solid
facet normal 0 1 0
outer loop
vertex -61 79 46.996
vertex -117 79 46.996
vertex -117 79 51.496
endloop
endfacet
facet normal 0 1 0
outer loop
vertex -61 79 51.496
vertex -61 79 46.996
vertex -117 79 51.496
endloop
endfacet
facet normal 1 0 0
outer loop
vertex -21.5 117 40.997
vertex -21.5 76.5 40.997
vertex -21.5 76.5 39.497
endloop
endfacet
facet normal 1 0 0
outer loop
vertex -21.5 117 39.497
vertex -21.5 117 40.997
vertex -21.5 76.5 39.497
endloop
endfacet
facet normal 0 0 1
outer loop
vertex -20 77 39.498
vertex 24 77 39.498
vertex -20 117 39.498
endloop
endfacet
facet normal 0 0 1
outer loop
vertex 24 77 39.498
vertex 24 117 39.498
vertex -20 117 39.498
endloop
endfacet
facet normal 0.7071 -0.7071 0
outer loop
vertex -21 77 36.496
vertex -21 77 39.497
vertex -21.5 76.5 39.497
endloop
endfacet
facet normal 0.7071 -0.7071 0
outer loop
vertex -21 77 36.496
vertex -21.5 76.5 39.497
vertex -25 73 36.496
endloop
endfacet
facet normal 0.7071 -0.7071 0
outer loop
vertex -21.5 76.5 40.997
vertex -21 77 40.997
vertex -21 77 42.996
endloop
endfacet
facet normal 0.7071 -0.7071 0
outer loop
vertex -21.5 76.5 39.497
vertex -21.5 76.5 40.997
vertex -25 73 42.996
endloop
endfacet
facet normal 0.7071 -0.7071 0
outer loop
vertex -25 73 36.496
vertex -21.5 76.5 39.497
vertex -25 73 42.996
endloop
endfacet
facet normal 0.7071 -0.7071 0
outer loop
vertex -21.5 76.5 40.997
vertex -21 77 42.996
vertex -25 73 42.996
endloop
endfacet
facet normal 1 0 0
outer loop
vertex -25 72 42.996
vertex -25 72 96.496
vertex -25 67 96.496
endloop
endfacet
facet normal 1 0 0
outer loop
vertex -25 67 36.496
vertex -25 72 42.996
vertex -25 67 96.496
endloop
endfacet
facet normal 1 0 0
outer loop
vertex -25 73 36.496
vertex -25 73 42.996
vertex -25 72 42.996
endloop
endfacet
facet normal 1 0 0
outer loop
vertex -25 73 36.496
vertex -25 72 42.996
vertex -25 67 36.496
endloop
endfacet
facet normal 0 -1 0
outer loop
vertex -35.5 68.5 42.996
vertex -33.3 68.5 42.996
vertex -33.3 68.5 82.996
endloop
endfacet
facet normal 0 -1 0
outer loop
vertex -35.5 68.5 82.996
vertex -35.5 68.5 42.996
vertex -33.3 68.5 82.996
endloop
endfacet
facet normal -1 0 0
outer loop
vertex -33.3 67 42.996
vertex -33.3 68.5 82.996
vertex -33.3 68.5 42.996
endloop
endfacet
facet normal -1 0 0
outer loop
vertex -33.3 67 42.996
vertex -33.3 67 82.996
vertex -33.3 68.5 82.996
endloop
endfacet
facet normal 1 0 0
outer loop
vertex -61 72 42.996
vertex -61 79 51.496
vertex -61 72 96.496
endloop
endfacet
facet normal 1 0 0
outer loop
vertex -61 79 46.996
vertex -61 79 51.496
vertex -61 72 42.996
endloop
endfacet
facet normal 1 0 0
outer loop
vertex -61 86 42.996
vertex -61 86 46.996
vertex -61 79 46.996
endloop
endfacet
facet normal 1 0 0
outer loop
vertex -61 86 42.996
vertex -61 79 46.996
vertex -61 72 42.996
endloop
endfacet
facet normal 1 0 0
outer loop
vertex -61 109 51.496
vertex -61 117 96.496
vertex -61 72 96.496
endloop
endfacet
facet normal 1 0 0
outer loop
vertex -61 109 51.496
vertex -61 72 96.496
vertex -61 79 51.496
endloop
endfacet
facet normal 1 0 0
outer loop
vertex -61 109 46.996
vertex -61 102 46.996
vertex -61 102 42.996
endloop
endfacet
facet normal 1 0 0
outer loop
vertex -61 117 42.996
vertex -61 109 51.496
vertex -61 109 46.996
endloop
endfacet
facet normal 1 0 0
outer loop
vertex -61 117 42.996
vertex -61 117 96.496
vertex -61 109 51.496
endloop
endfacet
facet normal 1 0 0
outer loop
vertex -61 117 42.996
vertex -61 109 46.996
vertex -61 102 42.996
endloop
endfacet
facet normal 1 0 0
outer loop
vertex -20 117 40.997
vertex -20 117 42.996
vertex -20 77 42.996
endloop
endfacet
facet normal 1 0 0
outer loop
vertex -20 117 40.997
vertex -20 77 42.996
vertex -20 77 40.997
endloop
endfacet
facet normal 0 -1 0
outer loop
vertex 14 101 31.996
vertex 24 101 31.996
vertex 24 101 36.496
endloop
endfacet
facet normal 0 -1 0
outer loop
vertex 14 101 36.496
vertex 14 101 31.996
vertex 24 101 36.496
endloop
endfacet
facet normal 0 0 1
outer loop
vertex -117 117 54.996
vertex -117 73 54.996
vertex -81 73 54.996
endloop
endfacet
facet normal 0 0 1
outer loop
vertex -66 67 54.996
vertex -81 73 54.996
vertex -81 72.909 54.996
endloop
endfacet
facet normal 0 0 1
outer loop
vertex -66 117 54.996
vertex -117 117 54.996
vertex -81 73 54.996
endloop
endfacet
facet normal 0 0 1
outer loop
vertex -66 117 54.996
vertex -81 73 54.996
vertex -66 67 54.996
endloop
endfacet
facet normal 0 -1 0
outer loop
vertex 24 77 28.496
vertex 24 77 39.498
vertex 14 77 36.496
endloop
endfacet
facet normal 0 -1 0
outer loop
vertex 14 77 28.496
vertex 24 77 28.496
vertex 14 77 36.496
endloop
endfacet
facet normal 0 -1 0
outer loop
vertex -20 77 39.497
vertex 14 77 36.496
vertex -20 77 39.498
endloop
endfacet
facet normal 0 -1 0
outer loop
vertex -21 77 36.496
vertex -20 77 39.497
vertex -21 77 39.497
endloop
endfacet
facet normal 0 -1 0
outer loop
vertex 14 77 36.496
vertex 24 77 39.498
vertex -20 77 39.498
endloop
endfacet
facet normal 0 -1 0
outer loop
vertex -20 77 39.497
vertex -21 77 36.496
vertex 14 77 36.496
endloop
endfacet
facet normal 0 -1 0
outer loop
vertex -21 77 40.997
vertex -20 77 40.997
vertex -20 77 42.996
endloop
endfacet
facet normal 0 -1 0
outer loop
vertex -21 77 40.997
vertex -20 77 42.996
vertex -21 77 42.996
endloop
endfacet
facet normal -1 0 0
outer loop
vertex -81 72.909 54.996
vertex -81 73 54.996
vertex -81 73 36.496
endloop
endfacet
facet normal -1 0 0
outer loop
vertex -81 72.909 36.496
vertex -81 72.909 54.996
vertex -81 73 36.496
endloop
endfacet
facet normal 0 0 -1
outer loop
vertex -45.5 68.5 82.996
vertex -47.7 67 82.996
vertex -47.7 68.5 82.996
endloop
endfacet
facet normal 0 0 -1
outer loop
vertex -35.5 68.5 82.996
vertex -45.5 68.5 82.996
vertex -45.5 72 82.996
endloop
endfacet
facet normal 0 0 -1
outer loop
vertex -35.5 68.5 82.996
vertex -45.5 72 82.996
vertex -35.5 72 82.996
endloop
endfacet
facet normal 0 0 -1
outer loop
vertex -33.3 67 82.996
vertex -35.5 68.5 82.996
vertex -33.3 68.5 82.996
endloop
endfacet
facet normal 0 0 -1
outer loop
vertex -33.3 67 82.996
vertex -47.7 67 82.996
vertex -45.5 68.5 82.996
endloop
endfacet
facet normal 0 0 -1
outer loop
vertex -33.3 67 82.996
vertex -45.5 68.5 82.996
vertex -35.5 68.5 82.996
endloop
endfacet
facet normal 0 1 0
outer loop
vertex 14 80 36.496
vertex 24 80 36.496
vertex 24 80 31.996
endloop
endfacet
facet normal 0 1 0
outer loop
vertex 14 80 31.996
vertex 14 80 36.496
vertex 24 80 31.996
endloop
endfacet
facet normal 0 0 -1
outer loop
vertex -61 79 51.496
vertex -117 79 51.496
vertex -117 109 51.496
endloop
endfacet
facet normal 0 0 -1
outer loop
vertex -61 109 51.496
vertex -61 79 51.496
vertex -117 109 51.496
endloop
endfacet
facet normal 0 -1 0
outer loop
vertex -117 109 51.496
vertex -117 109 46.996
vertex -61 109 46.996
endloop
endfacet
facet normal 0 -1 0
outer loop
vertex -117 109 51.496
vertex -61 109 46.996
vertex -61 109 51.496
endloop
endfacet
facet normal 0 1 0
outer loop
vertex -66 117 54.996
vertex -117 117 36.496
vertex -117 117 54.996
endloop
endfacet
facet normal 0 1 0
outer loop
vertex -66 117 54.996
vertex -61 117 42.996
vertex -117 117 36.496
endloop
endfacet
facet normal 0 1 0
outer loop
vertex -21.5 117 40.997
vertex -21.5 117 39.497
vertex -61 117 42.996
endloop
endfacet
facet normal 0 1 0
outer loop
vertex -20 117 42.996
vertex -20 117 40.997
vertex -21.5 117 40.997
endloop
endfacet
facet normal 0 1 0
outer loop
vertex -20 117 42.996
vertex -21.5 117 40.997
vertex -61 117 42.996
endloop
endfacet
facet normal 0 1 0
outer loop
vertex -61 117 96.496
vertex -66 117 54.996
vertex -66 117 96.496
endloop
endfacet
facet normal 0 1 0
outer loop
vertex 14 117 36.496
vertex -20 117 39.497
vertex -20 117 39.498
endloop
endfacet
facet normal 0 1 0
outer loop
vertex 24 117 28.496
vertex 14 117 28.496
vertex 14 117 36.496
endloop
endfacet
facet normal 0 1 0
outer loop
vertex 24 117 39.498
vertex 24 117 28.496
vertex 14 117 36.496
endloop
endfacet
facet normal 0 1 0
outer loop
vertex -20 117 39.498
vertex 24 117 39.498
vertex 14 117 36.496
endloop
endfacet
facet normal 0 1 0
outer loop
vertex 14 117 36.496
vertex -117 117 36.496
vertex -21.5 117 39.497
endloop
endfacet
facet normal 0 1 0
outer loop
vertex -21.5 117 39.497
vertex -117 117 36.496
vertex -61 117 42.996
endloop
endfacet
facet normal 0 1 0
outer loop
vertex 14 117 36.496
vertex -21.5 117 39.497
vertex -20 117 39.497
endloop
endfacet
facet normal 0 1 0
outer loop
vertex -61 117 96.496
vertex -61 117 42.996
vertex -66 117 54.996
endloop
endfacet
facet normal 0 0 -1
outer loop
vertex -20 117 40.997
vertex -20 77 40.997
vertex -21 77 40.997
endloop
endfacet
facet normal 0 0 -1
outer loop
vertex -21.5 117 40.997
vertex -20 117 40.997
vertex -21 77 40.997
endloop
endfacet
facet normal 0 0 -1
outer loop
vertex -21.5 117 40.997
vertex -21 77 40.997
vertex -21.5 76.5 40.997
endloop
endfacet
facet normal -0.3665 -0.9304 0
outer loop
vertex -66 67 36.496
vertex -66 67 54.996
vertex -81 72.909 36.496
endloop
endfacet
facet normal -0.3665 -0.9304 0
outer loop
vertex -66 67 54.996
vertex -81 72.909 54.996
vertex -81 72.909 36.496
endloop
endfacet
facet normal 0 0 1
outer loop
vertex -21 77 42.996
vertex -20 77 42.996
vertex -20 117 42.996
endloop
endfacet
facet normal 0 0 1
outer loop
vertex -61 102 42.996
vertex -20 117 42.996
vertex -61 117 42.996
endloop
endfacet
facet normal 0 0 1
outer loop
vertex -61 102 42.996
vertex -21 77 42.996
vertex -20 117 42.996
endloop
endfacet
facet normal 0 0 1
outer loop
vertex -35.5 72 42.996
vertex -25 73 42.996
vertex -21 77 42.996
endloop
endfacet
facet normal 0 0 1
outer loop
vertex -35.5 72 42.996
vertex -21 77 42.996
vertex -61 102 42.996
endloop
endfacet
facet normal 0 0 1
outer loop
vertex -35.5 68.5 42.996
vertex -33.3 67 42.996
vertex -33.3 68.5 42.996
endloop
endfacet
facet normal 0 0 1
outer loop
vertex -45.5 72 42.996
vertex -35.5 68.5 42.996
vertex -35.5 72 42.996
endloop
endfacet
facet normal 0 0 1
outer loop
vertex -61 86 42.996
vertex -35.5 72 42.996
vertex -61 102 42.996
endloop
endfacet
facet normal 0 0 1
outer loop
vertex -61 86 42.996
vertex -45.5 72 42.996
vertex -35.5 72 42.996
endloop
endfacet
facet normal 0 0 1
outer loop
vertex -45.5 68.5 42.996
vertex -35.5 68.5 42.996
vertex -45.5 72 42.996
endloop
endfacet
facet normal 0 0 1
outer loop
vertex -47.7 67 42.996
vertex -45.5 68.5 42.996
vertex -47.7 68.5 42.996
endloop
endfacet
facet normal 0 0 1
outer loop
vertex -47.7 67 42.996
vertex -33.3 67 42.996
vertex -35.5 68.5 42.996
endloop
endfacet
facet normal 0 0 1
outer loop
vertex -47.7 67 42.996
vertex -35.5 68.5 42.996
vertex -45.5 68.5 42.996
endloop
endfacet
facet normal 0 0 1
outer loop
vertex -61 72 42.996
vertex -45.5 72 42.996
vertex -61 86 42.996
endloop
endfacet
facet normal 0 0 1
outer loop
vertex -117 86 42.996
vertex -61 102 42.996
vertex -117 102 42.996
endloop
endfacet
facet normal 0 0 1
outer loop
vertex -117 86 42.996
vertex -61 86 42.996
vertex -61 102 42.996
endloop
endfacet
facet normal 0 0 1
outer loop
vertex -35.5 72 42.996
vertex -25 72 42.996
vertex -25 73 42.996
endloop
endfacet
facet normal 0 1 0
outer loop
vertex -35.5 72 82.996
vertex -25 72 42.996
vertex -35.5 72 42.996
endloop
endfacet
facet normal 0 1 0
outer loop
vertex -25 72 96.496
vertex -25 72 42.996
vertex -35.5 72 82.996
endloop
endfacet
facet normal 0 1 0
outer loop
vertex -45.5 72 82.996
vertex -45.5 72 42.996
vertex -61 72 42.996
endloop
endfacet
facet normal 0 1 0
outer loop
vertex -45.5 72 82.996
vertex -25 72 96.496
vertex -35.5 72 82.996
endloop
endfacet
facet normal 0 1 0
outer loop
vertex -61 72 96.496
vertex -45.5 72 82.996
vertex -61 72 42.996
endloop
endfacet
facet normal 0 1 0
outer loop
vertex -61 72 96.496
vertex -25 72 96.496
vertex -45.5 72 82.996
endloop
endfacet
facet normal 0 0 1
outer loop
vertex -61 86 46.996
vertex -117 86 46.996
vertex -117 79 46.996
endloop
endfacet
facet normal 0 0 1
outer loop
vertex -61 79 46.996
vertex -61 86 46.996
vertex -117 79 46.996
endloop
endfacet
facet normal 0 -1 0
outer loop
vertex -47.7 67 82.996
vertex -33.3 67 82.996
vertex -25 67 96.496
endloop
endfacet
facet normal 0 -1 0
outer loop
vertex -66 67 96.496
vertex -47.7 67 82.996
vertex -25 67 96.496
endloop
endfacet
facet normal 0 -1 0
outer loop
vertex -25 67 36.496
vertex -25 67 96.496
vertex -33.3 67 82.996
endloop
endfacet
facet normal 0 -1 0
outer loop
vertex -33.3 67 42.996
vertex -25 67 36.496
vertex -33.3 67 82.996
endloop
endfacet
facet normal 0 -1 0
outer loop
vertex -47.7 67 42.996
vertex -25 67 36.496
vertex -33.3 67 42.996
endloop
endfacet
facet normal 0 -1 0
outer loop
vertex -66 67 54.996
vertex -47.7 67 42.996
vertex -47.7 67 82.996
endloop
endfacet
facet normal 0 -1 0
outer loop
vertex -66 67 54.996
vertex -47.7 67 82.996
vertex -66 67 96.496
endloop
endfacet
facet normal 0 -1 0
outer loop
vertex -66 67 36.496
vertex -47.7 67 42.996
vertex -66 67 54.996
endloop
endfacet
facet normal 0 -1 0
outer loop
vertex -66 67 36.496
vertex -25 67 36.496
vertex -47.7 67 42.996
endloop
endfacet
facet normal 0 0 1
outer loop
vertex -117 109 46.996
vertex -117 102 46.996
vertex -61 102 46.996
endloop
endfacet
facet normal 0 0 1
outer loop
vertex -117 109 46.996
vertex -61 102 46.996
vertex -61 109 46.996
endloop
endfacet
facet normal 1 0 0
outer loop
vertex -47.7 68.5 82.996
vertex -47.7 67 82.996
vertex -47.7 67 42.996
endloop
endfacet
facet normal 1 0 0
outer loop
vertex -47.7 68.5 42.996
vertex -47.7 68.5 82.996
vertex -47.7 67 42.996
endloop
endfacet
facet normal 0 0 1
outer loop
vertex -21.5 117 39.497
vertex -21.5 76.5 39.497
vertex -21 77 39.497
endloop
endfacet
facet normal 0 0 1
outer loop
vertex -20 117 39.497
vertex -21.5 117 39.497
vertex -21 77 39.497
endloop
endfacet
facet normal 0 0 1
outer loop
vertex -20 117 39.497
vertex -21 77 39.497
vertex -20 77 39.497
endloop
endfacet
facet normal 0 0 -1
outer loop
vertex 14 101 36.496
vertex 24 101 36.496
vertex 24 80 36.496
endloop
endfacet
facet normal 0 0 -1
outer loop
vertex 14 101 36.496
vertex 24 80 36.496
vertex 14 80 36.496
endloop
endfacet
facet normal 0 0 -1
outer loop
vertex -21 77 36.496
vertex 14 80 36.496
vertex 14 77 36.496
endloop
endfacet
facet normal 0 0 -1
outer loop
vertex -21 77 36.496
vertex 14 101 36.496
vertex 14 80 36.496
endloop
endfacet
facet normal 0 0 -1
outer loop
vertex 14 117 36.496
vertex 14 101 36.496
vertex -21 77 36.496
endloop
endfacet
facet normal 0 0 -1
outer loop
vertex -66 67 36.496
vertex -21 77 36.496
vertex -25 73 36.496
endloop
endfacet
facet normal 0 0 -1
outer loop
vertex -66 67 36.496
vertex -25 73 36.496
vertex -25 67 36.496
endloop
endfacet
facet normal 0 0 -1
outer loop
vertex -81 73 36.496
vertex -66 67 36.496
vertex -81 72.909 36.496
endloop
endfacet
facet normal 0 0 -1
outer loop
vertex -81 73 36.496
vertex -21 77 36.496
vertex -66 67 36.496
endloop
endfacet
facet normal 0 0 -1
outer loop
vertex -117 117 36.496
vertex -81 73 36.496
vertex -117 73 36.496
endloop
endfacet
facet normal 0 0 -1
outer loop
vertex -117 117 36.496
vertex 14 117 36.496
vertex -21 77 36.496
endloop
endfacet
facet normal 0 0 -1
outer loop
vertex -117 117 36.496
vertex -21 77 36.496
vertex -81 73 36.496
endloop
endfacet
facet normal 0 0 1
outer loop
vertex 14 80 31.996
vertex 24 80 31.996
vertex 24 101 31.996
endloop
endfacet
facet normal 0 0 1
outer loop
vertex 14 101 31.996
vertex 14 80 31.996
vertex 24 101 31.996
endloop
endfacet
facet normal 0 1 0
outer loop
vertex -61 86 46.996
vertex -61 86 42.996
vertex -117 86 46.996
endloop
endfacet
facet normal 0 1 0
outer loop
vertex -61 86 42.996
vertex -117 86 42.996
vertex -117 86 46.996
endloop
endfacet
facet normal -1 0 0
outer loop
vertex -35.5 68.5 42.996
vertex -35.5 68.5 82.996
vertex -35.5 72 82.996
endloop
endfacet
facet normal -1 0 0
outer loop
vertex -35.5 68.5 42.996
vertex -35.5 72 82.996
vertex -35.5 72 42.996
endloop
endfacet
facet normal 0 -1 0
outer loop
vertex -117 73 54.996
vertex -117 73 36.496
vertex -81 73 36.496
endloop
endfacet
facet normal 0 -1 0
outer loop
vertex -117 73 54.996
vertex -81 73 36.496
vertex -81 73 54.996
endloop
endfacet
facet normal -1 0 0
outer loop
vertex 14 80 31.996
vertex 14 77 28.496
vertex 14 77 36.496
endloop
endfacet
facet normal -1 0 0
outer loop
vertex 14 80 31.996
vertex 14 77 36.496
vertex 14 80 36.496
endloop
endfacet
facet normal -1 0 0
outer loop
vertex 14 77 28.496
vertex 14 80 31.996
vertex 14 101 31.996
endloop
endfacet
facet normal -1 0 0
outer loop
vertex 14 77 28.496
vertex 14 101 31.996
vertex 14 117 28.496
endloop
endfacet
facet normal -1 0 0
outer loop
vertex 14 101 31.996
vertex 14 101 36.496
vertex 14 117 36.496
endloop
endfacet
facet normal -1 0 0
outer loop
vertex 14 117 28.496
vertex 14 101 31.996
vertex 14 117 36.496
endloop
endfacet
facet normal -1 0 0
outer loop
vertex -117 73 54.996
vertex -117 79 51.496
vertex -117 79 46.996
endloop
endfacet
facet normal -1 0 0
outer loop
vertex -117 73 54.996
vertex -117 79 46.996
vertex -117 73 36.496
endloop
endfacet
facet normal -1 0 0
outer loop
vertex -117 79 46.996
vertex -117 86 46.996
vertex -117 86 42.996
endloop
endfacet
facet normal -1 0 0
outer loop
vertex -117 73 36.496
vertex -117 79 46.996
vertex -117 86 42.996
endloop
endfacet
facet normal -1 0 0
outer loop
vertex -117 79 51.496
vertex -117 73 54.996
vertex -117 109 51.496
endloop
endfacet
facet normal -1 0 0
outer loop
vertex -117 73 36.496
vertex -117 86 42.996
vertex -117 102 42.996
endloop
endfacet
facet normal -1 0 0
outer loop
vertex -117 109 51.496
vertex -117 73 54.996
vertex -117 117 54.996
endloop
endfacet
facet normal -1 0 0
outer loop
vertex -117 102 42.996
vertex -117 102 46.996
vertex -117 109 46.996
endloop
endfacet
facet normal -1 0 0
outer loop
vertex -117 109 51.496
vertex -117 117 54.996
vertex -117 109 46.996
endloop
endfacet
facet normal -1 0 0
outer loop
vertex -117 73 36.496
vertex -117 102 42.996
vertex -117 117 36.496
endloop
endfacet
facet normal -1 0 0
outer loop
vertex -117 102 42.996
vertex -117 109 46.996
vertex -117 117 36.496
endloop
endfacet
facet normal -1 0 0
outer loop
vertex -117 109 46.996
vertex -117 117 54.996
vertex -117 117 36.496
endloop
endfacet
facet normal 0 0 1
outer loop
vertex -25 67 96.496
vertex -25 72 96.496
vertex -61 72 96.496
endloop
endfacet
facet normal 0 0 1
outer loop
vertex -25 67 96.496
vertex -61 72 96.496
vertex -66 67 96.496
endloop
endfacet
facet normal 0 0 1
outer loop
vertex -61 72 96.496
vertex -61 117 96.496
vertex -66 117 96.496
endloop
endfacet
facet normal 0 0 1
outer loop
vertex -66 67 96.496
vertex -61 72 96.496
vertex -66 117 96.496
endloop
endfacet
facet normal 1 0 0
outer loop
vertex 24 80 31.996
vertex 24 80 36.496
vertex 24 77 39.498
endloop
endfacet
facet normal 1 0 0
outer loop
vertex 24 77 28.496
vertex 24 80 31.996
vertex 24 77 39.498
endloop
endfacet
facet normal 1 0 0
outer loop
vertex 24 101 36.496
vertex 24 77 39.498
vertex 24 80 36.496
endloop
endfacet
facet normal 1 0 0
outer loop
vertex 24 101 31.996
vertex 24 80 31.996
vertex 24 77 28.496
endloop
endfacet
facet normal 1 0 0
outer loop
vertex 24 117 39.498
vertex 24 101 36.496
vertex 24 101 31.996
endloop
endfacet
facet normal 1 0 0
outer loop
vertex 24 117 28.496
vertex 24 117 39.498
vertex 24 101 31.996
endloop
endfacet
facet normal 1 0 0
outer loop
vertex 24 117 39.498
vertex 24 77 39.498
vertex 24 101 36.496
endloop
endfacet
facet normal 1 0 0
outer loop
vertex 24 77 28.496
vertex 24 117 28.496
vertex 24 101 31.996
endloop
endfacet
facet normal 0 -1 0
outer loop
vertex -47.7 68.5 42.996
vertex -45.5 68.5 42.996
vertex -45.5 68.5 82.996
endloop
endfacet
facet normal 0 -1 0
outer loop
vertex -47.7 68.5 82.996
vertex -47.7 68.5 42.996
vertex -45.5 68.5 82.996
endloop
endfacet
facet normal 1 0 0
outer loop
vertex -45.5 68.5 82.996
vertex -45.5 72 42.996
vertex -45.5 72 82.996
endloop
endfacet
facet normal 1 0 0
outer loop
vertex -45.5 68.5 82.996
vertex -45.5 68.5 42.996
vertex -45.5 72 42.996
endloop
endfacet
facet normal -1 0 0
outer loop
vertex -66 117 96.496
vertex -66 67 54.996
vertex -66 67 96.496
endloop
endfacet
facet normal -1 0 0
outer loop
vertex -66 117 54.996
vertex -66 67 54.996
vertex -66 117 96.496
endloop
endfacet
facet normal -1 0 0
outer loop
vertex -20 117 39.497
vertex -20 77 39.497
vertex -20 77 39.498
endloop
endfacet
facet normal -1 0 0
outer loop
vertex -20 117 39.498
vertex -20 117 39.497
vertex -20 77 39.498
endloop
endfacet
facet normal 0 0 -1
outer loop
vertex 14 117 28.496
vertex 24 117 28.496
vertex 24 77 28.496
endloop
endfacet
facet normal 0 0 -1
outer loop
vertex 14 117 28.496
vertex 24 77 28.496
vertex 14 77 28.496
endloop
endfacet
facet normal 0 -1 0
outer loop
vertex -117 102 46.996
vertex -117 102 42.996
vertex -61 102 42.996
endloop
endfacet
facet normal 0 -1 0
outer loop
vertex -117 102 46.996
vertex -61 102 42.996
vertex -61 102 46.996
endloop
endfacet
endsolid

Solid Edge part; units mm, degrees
sketch "Sketch1" plane through (0, 117, 0) normal (0, -1, 0) x (1, 0, 0)
  line L0 (-117, 54.9958) -> (-61, 54.9958)
  line L1 (-61, 54.9958) -> (-61, 42.9958)
  line L2 (-61, 42.9958) -> (-20, 42.9958)
  line L3 (-20, 42.9958) -> (-20, 39.4975)
  line L4 (24, 39.4975) -> (-20, 39.4975)
  line L5 (24, 39.4975) -> (24, 36.4958)
  line L6 (24, 36.4958) -> (-117, 36.4958)
  line L7 (-117, 54.9958) -> (-117, 36.4958)
extrude "Protrusion1" add sketch "Sketch1" along normal blind 44
sketch "Sketch2" plane through (-117, 95, 45.2466) normal (-1, 0, 0) x (0, -1, 0)
  line L0 (9, 1.7492) -> (16, 1.7492)
  line L1 (16, 1.7492) -> (16, 6.2492)
  line L2 (16, 6.2492) -> (1, 6.2492)
  line L3 (-14, 6.2492) -> (1, 6.2492)
  line L4 (-14, 1.7492) -> (-14, 6.2492)
  line L5 (-7, 1.7492) -> (-14, 1.7492)
  line L6 (-7, -2.2508) -> (-7, 1.7492)
  line L7 (-7, -2.2508) -> (9, -2.2508)
  line L8 (9, -2.2508) -> (9, 1.7492)
extrude "Cutout1" cut sketch "Sketch2" against normal up to next
sketch "Sketch3" plane through (-2.5, 73, 39.2466) normal (0, -1, 0) x (1, 0, 0)
  line L0 (-17.5, 1.7508) -> (-19, 1.7508)
  line L1 (-19, 1.7508) -> (-19, 0.2508)
  line L2 (-19, 0.2508) -> (-17.5, 0.2508)
  line L3 (-17.5, 0.2508) -> (-17.5, 1.7508)
extrude "Cutout2" cut sketch "Sketch3" against normal up to next
sketch "Sketch4" plane through (3.25, 95, 39.4975) normal (0, 0, 1) x (1, 0, 0)
  line L0 (20.75, -22) -> (20.75, -18)
  line L1 (20.75, -18) -> (-24.25, -18)
  line L2 (-24.25, -18) -> (-28.25, -22)
  line L3 (20.75, -22) -> (-28.25, -22)
extrude "Cutout3" cut sketch "Sketch4" against normal up to next and the other way up to next
sketch "Sketch5" plane through (-46.5, 92.5, 36.4958) normal (0, 0, -1) x (0, 1, 0)
  line L0 (-15.5, 60.5) -> (24.5, 60.5)
  line L1 (24.5, 60.5) -> (24.5, 70.5)
  line L2 (24.5, 70.5) -> (-15.5, 70.5)
  line L3 (-15.5, 70.5) -> (-15.5, 60.5)
extrude "ExtrudedProtrusion_6" add sketch "Sketch5" along normal blind 8
sketch "Sketch6" plane through (24, 98.5, 34.4966) normal (1, 0, 0) x (0, 1, 0)
  line L0 (2.5, -2.5008) -> (2.5, 1.9992)
  line L1 (2.5, 1.9992) -> (-18.5, 1.9992)
  line L2 (-18.5, 1.9992) -> (-18.5, -2.5008)
  line L3 (-18.5, -2.5008) -> (2.5, -2.5008)
extrude "Cutout4" cut sketch "Sketch6" against normal up to next
sketch "Sketch7" plane through (-71, 73, 45.7458) normal (0, -1, 0) x (1, 0, 0)
  line L0 (10, 50.75) -> (10, 9.25)
  line L1 (10, 9.25) -> (-10, 9.25)
  line L2 (-10, 9.25) -> (-10, -9.25)
  line L3 (-10, -9.25) -> (46, -9.25)
  line L4 (46, 50.75) -> (46, -9.25)
  line L5 (10, 50.75) -> (46, 50.75)
extrude "ExtrudedProtrusion_7" add sketch "Sketch7" along normal blind 6
chamfer "Chamfer_4" distance 15 angle 21.5 1 edges at (-81, 67, 45.7458) measured on face at (-52.44, 67, 87.0958)
sketch "Sketch8" plane through (-47.75, 67, 59.9958) normal (0, -1, 0) x (1, 0, 0)
  line L0 (2.25, -17) -> (2.25, 23)
  line L1 (2.25, 23) -> (12.25, 23)
  line L2 (12.25, 23) -> (12.25, -17)
  line L3 (12.25, -17) -> (2.25, -17)
extrude "Cutout5" cut sketch "Sketch8" against normal up to next
sketch "Sketch9" plane through (-47.75, 67, 59.9958) normal (0, -1, 0) x (1, 0, 0)
  line L0 (14.45, -17) -> (0.05, -17)
  line L1 (0.05, 23) -> (0.05, -17)
  line L2 (0.05, 23) -> (14.45, 23)
  line L3 (14.45, 23) -> (14.45, -17)
extrude "ExtrudedCutout_8" cut sketch "Sketch9" against normal blind 1.5
sketch "Sketch10" plane through (-89, 92.5, 54.9958) normal (0, 0, 1) x (0, -1, 0)
  line L0 (25.5, 23) -> (-24.5, 23)
  line L1 (-24.5, 23) -> (-24.5, 28)
  line L2 (-24.5, 28) -> (25.5, 28)
  line L3 (25.5, 28) -> (25.5, 23)
extrude "Protrusion2" add sketch "Sketch10" along normal up to vertex (41.5 mm away)
sketch "Sketch11" plane through (-45.5, 92, 96.4958) normal (0, 0, 1) x (1, 0, 0)
  line L0 (20.5, -20) -> (-15.5, -20)
  line L1 (-15.5, -20) -> (-15.5, -19)
  line L2 (-15.5, -19) -> (20.5, -19)
  line L3 (20.5, -19) -> (20.5, -20)
extrude "Cutout6" cut sketch "Sketch11" against normal up to vertex (53.5 mm away)
